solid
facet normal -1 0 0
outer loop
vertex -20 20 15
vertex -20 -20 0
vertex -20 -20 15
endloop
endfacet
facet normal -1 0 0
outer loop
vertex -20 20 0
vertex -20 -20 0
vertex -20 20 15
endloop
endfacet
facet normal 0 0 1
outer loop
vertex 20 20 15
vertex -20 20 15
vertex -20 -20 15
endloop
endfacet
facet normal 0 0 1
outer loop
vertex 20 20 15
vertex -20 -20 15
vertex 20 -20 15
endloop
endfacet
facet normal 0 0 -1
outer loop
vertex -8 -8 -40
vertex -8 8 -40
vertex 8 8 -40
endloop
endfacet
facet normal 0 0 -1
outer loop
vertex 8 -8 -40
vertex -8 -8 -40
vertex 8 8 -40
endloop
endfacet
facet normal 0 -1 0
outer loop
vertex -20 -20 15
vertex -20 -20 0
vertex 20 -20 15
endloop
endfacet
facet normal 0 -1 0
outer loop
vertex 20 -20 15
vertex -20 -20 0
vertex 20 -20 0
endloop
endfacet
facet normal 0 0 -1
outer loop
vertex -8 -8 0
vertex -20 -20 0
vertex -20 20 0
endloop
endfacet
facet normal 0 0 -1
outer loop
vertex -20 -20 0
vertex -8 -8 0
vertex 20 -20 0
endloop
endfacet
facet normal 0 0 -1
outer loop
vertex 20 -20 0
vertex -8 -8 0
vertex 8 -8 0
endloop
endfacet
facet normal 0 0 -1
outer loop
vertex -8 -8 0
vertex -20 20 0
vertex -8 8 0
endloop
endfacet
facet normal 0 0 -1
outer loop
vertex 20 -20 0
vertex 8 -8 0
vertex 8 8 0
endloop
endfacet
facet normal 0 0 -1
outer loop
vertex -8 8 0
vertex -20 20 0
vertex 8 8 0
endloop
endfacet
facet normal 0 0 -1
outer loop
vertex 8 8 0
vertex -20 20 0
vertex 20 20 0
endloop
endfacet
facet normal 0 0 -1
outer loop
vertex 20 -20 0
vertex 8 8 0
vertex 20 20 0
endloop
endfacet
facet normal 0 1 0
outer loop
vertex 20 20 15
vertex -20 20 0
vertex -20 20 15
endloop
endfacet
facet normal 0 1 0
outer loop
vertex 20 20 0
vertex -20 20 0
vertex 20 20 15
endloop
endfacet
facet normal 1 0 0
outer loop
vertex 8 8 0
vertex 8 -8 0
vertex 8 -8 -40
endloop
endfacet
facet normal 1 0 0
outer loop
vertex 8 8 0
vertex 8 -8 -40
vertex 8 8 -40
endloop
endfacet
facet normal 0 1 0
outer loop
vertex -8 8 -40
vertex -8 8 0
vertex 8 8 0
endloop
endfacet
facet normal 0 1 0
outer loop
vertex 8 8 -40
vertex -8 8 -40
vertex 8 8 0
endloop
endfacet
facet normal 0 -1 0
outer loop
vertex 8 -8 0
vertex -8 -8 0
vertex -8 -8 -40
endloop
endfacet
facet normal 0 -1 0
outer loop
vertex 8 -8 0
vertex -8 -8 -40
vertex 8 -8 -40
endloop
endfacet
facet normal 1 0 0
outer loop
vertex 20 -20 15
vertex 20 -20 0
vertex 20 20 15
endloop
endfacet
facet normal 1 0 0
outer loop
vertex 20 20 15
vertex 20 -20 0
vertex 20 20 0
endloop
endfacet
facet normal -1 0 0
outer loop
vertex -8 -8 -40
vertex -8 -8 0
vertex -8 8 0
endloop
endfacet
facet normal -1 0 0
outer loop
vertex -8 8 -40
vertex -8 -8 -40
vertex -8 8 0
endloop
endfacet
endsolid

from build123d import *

# Parameters (mm, degrees)
SKETCH_1_W      = 40
SKETCH_1_H      = 40
SKETCH_1_W_2    = 16
SKETCH_1_H_2    = 16
EXTRUDE_2_DEPTH = 15
SKETCH_2_W      = 16
SKETCH_2_H      = 16
EXTRUDE_3_DEPTH = 55


with BuildPart() as part:
    # 草图1 → 凸台-拉伸2 (new body)
    with BuildSketch(Plane.XY):
        Rectangle(SKETCH_1_W, SKETCH_1_H)
        Rectangle(SKETCH_1_W_2, SKETCH_1_H_2, mode=Mode.SUBTRACT)
    extrude(amount=EXTRUDE_2_DEPTH)

    # 草图2 → 凸台-拉伸3 (add)
    with BuildSketch(Plane.XY.offset(15)):
        Rectangle(SKETCH_2_W, SKETCH_2_H)
    extrude(amount=-EXTRUDE_3_DEPTH)


solid = part.part
